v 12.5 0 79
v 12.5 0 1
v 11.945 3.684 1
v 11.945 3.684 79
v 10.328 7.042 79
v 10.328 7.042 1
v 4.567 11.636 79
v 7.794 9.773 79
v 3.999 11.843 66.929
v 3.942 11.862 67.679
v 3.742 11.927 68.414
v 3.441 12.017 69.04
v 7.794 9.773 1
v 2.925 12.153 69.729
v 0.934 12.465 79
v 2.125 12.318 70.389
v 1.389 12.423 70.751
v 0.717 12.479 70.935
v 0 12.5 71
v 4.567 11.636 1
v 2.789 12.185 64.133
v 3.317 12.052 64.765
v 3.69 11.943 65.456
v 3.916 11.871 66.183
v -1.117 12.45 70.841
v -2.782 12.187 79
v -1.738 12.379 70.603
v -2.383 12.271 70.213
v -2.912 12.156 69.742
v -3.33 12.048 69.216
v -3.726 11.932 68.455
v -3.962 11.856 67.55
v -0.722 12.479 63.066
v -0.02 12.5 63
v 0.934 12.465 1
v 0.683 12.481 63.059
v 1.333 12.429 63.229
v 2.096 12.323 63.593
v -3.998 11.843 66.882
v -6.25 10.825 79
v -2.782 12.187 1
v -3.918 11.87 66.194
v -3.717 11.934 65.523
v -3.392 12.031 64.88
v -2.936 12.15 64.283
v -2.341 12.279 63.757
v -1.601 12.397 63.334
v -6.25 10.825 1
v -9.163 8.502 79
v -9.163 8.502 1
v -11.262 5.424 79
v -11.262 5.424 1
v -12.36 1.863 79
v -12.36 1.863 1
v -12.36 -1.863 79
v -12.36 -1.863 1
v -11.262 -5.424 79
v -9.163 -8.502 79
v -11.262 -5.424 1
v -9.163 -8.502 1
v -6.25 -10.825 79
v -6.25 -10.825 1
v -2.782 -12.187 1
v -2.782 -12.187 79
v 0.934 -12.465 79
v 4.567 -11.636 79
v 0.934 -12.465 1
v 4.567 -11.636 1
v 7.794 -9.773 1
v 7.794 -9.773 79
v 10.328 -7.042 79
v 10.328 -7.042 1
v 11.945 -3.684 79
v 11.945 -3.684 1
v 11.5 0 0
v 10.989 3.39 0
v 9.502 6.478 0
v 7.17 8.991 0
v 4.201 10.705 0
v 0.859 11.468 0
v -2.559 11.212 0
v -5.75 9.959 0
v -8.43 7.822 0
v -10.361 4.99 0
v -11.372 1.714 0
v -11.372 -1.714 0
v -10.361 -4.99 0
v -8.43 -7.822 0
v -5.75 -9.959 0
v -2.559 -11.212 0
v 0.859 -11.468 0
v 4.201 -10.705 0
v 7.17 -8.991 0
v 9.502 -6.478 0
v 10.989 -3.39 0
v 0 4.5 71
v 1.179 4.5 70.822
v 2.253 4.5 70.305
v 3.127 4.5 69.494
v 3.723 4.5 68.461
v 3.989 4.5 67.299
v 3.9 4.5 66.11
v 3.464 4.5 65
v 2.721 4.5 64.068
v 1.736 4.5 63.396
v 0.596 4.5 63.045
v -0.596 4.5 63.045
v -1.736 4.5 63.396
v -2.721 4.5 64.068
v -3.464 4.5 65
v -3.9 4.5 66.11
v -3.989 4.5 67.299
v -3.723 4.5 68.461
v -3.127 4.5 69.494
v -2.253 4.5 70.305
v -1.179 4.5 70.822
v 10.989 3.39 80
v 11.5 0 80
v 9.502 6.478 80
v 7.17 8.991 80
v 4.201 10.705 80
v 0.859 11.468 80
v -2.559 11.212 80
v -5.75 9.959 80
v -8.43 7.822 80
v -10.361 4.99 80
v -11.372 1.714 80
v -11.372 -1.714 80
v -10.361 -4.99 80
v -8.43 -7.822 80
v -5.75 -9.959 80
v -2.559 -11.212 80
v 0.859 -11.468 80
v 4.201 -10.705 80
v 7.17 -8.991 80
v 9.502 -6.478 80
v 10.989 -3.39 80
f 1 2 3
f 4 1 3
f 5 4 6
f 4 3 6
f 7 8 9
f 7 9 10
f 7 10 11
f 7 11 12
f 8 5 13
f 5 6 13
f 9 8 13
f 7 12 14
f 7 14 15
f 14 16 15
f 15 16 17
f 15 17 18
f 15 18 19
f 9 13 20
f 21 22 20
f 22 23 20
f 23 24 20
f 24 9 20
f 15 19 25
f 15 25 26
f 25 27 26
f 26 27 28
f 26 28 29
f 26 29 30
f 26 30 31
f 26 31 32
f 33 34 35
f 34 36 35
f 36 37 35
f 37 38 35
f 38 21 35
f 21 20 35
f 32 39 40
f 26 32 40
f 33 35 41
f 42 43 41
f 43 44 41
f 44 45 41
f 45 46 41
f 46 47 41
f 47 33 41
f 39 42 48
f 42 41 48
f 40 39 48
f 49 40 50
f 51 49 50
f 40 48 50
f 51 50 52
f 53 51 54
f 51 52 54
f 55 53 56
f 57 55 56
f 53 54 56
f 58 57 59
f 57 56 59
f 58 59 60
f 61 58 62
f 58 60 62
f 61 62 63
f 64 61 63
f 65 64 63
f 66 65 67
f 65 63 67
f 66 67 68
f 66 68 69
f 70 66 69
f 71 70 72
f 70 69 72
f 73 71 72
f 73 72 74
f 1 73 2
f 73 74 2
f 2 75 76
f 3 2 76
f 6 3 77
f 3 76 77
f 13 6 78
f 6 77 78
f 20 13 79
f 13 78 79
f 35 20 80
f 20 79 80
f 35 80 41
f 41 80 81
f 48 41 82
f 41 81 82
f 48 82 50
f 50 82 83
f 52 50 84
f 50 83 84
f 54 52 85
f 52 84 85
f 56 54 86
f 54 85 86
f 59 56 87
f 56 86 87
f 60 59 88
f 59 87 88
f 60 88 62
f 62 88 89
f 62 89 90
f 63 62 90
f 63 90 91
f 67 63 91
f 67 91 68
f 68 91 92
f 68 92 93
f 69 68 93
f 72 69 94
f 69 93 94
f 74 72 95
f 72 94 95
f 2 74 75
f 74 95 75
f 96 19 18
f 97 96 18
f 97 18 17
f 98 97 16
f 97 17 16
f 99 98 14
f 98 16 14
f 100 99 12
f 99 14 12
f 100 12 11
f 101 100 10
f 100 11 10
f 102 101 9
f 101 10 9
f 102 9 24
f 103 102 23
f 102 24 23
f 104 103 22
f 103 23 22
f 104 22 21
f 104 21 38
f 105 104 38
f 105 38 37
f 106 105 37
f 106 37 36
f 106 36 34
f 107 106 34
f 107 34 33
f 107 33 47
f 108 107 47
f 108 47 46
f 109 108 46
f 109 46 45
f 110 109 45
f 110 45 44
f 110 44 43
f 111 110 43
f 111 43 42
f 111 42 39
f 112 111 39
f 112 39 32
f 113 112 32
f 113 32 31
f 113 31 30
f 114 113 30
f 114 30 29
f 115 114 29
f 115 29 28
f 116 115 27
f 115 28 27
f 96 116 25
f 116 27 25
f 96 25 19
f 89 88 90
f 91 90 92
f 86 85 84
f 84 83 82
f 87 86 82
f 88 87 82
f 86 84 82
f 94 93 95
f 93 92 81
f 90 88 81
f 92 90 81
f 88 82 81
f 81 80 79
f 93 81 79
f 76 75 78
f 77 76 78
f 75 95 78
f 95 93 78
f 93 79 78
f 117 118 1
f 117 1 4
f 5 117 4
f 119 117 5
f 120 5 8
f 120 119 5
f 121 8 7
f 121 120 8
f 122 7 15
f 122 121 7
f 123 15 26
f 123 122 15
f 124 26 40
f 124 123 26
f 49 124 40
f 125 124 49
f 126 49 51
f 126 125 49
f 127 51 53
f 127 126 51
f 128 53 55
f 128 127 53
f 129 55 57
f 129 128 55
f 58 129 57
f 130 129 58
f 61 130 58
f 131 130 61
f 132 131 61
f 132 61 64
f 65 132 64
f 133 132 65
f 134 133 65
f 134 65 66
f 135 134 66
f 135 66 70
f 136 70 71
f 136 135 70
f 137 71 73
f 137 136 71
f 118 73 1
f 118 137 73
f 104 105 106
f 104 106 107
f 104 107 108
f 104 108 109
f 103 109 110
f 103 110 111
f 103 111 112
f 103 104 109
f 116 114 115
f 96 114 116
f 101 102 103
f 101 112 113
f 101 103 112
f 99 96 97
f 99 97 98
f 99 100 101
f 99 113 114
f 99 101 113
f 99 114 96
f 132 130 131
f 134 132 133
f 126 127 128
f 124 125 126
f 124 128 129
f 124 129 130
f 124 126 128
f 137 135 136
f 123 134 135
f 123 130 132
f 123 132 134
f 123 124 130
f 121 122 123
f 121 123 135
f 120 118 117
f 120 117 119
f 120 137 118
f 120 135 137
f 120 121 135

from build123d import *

# Parameters (mm, degrees)
SKETCH1_R           = 12.5
BOSS_EXTRUDE4_DEPTH = 80
SKETCH5_R           = 4
CUT_EXTRUDE4_DEPTH  = 8
CHAMFER5_SIZE       = 1


with BuildPart() as part:
    # Sketch1 → Boss-Extrude4 (new body)
    with BuildSketch(Plane.XY):
        Circle(SKETCH1_R)
    extrude(amount=BOSS_EXTRUDE4_DEPTH)

    # Sketch5 → Cut-Extrude4 (cut)
    with BuildSketch(Plane(origin=(0, 12.5, 0), x_dir=(1, 0, 0), z_dir=(0, 1, 0))):
        with Locations(Location((0, -67, 0), (0, 0, 270))):
            Circle(SKETCH5_R)
    extrude(amount=-CUT_EXTRUDE4_DEPTH, mode=Mode.SUBTRACT)

    # Chamfer5
    chamfer5_edges = [part.edges().sort_by_distance(p)[0] for p in [
        (-12.5, 0, 0),
        (-12.5, 0, 80),
    ]]
    chamfer(chamfer5_edges, length=CHAMFER5_SIZE)


solid = part.part
